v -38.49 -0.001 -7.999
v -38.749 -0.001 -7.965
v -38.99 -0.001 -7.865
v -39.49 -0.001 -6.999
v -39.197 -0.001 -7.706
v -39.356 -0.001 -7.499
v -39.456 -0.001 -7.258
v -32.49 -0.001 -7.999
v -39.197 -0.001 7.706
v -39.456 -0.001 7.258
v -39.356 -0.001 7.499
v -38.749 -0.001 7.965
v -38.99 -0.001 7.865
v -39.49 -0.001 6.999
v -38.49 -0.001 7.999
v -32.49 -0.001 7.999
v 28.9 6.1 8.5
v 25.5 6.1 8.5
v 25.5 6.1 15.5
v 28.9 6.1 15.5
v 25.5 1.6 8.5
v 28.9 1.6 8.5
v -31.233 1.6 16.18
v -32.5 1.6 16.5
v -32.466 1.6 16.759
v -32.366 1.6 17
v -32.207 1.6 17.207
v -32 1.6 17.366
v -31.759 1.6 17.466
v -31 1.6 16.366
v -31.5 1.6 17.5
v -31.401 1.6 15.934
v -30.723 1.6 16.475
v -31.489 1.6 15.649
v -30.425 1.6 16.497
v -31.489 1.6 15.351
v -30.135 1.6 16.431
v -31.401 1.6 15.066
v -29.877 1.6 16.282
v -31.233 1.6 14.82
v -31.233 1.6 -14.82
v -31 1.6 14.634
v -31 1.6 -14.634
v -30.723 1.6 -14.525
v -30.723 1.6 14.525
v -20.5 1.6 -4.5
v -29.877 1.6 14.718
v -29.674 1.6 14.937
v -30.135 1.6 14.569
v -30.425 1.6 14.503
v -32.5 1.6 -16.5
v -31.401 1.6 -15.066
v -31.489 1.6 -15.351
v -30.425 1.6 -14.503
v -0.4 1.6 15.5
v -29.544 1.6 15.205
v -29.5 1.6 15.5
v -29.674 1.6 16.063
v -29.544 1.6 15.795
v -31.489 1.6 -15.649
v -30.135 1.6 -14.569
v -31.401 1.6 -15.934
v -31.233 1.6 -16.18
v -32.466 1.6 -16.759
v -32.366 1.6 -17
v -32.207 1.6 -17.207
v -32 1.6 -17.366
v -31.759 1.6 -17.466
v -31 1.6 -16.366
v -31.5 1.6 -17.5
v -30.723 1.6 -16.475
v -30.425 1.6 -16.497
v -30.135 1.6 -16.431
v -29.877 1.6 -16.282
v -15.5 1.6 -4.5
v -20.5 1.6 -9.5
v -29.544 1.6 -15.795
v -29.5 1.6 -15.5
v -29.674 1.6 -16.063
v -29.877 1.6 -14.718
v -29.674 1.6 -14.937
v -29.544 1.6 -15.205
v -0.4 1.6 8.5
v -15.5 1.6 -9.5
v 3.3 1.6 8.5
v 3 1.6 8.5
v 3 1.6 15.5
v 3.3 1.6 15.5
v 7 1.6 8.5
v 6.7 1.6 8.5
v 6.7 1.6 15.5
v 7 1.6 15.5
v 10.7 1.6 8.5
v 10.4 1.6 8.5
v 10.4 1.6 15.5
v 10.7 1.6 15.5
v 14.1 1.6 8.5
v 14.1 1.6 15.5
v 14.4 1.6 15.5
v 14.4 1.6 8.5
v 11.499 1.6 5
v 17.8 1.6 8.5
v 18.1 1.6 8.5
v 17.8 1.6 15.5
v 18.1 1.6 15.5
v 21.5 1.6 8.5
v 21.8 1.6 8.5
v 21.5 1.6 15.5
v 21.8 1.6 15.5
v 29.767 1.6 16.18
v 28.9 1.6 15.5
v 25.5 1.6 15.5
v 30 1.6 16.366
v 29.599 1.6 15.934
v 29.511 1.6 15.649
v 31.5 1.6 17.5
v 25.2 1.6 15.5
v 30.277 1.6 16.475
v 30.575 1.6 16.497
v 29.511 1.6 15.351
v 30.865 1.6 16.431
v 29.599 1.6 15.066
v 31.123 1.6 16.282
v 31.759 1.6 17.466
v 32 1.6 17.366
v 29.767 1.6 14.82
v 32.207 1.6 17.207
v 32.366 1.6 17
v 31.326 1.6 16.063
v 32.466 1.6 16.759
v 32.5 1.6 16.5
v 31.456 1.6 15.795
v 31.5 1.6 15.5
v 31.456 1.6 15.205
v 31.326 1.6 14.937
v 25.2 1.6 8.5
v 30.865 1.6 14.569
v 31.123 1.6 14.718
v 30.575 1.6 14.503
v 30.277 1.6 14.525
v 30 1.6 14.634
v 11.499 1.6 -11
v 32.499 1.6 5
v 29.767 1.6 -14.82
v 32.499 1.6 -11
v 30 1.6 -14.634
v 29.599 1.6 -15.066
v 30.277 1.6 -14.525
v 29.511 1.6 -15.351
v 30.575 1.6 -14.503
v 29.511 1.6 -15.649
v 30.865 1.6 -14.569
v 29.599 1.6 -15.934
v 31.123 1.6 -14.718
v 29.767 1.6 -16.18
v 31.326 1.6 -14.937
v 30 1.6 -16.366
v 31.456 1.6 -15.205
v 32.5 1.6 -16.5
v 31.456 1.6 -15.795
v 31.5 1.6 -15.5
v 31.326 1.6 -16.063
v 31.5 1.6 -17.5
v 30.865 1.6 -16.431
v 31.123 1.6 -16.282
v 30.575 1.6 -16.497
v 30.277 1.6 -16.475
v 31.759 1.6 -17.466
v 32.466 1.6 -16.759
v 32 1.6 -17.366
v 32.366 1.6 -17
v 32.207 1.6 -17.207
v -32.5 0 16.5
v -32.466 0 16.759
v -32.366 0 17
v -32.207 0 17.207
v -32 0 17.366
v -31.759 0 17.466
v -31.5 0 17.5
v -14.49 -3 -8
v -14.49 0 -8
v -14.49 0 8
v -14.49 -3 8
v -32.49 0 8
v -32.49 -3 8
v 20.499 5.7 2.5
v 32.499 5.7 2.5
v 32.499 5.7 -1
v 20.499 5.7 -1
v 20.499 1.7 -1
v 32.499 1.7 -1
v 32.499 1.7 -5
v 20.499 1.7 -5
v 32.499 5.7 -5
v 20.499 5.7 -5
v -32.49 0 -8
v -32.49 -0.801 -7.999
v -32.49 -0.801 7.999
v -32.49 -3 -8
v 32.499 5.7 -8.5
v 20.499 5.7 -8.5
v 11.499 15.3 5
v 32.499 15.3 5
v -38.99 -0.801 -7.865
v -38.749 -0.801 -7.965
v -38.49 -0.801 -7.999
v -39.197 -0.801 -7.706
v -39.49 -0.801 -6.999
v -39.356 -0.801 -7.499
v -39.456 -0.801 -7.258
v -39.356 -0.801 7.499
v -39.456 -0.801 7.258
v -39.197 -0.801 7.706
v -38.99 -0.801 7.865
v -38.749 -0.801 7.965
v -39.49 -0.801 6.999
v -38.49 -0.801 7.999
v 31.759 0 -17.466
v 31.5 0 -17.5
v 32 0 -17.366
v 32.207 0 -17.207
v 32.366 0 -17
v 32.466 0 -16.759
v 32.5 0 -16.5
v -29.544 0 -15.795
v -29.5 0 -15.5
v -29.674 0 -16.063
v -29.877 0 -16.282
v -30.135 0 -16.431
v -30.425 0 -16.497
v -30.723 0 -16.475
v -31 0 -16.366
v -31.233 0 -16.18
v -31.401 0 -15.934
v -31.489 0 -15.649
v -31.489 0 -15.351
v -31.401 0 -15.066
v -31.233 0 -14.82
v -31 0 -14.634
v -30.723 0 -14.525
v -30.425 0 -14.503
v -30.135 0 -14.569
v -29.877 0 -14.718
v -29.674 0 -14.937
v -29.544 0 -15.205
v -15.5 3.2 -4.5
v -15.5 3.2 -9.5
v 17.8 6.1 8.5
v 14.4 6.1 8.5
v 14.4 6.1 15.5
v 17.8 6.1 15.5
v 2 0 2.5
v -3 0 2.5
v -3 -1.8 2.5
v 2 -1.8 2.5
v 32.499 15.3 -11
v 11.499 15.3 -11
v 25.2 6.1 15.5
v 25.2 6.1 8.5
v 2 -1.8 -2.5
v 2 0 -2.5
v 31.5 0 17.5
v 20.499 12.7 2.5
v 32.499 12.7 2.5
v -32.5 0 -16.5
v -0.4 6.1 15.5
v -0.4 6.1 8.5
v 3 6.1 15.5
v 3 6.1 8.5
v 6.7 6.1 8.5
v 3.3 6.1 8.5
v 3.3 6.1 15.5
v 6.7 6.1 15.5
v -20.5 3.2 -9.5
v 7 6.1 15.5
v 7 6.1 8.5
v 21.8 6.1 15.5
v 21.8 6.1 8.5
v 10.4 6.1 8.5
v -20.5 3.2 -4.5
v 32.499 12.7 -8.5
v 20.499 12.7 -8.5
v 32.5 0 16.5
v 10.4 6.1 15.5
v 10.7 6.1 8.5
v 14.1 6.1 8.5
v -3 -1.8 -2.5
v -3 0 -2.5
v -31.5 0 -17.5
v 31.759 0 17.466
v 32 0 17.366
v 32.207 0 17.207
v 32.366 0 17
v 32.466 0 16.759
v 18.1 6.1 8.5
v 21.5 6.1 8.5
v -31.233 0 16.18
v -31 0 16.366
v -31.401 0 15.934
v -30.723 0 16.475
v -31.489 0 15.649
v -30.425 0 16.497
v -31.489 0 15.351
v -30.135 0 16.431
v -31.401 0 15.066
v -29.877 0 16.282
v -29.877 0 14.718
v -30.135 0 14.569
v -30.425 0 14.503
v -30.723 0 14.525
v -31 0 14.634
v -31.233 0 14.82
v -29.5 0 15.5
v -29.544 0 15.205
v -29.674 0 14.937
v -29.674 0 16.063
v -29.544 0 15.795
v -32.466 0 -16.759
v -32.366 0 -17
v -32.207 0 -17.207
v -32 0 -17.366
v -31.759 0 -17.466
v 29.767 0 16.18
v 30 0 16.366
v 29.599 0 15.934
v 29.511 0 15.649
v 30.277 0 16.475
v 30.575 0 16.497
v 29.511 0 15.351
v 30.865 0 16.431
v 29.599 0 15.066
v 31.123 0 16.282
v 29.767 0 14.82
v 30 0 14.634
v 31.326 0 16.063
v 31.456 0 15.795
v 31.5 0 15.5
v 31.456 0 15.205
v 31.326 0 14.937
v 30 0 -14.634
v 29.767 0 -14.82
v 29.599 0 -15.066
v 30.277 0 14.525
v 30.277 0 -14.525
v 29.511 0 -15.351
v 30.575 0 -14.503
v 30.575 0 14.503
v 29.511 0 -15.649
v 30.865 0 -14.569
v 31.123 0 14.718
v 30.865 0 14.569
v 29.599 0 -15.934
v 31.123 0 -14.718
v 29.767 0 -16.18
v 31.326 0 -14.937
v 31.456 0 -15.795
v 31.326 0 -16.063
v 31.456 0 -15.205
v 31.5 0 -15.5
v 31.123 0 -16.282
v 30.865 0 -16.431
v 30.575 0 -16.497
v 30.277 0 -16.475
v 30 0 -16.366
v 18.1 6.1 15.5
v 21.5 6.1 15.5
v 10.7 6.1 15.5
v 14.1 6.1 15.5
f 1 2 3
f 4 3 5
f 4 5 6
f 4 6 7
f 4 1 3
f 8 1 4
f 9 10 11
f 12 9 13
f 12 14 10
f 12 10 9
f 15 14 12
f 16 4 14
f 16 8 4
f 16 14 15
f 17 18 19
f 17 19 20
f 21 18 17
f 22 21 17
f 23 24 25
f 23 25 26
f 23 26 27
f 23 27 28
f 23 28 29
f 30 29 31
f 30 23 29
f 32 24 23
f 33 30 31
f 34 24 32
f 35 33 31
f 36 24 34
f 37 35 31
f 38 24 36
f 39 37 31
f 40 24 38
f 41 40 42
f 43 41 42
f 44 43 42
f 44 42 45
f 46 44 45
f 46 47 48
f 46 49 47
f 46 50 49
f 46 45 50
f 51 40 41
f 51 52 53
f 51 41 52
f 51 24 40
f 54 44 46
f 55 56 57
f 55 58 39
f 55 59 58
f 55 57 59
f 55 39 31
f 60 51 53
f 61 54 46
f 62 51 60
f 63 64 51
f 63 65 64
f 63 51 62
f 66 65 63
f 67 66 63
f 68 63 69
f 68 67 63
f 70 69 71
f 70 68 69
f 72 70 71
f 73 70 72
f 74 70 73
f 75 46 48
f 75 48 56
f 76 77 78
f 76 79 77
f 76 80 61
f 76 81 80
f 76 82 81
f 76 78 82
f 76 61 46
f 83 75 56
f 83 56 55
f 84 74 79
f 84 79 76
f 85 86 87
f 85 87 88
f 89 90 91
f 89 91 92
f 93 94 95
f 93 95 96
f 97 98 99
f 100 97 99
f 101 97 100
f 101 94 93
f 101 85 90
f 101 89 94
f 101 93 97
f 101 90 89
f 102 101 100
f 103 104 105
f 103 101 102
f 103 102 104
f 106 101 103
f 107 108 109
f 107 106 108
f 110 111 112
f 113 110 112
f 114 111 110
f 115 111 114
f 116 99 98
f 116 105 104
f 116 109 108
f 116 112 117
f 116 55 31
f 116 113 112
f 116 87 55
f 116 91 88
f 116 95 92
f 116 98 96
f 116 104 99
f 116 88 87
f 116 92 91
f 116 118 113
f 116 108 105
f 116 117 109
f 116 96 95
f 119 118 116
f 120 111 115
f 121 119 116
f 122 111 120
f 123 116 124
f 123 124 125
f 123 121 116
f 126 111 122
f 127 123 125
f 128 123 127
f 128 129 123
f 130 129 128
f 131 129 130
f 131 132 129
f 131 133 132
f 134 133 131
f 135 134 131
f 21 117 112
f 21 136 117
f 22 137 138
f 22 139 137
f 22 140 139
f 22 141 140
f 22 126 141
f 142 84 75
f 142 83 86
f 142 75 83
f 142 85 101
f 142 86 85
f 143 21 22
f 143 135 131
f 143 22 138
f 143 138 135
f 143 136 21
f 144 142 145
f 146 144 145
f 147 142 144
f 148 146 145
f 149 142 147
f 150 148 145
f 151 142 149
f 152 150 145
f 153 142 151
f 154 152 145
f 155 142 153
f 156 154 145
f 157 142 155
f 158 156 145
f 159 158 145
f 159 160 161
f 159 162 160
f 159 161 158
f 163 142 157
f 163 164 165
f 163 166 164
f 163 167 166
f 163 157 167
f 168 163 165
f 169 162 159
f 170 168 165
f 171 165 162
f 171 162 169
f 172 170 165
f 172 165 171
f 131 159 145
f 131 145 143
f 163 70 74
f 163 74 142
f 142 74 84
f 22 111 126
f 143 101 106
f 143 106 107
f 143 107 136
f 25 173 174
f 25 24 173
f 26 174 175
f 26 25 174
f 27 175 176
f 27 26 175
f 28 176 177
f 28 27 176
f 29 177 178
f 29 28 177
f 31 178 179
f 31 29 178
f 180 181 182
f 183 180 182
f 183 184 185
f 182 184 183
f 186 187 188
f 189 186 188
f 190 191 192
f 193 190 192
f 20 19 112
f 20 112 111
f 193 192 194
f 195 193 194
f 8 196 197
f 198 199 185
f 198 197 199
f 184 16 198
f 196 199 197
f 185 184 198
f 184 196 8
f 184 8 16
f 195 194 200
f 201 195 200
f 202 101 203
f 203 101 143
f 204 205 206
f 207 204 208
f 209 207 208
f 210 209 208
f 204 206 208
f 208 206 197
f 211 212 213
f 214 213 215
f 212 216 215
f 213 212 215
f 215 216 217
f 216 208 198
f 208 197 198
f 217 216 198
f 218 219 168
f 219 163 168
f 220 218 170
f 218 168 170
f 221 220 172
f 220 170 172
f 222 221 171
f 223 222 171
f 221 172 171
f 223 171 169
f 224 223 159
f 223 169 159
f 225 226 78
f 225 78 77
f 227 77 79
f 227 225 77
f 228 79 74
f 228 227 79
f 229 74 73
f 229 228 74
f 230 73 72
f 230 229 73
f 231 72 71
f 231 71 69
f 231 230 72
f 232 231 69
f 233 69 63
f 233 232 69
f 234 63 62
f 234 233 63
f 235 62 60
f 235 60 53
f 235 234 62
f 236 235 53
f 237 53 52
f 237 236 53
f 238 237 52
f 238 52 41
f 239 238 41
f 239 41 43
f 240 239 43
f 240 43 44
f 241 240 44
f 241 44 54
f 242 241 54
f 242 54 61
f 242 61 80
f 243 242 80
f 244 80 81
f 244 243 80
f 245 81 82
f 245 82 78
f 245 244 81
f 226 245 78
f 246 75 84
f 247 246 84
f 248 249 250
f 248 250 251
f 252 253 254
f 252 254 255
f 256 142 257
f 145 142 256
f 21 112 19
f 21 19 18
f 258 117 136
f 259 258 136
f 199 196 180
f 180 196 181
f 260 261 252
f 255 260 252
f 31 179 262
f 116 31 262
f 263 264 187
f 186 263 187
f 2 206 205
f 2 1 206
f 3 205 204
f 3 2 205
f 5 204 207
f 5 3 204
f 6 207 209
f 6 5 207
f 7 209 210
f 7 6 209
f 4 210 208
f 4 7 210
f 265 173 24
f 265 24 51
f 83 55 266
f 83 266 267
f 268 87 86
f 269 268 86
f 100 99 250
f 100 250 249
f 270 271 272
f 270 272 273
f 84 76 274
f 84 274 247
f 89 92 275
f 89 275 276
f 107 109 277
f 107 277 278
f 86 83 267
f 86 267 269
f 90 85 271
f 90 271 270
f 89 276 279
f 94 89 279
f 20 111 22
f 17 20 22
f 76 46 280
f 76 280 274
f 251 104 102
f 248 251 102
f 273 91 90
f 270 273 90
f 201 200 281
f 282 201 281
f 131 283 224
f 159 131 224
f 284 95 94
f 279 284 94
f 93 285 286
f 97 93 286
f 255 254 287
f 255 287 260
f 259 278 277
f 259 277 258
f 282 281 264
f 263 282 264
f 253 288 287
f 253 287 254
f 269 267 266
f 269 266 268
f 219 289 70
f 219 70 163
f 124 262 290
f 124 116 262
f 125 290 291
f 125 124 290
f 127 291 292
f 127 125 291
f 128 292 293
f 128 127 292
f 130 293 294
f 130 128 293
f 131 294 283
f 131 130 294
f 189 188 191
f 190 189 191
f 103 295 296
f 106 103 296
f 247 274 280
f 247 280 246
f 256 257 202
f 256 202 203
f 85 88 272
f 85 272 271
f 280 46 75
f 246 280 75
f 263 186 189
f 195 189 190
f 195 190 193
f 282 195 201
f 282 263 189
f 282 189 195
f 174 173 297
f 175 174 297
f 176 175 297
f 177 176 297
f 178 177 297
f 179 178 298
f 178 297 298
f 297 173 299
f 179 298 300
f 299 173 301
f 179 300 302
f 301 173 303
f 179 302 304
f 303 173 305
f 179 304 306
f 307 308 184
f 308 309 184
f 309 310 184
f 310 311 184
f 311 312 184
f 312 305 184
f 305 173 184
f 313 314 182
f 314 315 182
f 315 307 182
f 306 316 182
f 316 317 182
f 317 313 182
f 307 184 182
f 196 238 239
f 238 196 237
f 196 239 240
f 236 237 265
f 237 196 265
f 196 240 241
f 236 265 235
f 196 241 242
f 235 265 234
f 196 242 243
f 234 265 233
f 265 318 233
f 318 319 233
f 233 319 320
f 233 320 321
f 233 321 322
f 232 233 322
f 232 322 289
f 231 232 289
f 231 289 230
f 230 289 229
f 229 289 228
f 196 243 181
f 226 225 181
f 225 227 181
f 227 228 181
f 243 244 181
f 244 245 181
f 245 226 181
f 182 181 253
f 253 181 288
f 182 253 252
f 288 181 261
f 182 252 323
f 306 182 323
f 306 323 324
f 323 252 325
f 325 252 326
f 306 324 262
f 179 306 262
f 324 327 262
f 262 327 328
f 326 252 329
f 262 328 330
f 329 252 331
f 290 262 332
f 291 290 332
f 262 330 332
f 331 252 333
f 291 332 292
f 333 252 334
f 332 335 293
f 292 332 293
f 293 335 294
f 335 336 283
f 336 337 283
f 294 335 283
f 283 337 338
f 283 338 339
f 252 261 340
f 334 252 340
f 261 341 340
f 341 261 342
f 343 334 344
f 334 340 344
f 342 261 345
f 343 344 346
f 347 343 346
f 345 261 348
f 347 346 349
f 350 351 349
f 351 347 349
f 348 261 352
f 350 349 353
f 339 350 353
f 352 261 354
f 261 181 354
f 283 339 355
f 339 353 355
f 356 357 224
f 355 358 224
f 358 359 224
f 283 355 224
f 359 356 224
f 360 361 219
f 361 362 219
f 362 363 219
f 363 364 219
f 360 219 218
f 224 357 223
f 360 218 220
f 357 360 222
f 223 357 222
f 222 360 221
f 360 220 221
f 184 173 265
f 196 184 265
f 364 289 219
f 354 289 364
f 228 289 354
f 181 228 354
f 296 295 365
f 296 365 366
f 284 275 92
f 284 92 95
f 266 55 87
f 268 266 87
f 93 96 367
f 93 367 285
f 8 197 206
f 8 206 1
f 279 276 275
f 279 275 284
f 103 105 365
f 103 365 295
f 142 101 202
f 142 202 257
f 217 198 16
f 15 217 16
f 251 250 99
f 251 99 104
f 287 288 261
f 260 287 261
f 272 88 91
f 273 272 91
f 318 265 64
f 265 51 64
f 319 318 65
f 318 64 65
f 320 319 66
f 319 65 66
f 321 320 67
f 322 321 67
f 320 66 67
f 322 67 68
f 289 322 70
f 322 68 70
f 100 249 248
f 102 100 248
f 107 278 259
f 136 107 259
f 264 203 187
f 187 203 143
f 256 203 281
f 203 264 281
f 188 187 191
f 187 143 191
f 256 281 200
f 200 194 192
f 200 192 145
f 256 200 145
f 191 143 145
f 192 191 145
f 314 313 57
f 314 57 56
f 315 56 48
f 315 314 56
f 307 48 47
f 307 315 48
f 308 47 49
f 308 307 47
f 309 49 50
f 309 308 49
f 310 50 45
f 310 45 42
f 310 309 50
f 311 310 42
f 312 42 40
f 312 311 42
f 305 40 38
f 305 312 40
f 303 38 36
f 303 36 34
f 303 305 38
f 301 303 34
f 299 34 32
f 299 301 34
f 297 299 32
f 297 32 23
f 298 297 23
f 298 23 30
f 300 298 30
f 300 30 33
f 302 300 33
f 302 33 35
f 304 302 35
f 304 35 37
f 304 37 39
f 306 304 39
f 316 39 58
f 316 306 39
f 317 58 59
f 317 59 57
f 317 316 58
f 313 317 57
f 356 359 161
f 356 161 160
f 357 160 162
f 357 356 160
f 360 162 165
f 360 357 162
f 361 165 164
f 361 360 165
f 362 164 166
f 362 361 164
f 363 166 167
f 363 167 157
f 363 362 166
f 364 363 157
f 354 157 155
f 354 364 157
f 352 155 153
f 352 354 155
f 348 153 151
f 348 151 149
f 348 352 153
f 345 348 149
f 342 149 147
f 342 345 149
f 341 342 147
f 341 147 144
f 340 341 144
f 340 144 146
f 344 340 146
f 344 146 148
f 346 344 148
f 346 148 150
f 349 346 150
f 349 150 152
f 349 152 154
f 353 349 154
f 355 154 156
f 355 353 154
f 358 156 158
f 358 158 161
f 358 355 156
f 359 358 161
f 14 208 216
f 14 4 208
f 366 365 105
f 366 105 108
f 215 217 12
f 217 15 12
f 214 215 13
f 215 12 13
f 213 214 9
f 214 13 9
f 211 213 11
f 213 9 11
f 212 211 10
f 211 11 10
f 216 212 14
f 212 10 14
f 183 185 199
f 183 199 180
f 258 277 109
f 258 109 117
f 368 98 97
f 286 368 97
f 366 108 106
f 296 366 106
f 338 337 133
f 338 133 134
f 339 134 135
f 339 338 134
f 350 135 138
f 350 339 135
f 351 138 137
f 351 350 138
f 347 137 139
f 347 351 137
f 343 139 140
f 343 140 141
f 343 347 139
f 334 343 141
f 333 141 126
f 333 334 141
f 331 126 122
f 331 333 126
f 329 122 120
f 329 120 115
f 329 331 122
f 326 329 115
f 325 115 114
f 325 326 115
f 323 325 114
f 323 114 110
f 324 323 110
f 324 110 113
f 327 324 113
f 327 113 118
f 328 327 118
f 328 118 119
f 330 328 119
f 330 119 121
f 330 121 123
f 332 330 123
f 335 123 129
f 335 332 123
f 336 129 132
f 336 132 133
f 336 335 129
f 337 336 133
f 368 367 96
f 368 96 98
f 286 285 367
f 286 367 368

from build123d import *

# Parameters (mm, degrees)
SKIZZE1_W                       = 65
SKIZZE1_H                       = 35
SKIZZE1_R                       = 1
AUFSATZ_LINEAR_AUSTRAGEN1_DEPTH = 1.6
VERRUNDUNG1_R                   = 1
SKIZZE2_W                       = 18
SKIZZE2_H                       = 16
AUFSATZ_LINEAR_AUSTRAGEN2_DEPTH = 3
SKIZZE3_W                       = 15.998
SKIZZE3_H                       = 0.8
AUFSATZ_LINEAR_AUSTRAGEN3_DEPTH = 7
VERRUNDUNG2_R                   = 1
SKIZZE4_W                       = 21
SKIZZE4_H                       = 16
AUFSATZ_LINEAR_AUSTRAGEN4_DEPTH = 13.7
SCHNITT_LINEAR_AUSTRAGEN1_DEPTH = 12
SKIZZE6_W                       = 3.4
SKIZZE6_H                       = 7
AUFSATZ_LINEAR_AUSTRAGEN5_DEPTH = 4.5
SKIZZE7_W                       = 5
SKIZZE7_H                       = 5
AUFSATZ_LINEAR_AUSTRAGEN6_DEPTH = 1.8
SKIZZE8_W                       = 5
SKIZZE8_H                       = 5
AUFSATZ_LINEAR_AUSTRAGEN7_DEPTH = 1.6


with BuildPart() as part:
    # Skizze1 → Aufsatz-Linear austragen1 (new body)
    with BuildSketch(Plane(origin=(0, 0, 0), x_dir=(1, 0, 0), z_dir=(0, 1, 0))):
        Rectangle(SKIZZE1_W, SKIZZE1_H)
        with Locations((-30.5, -15.5)):
            Circle(SKIZZE1_R, mode=Mode.SUBTRACT)
        with Locations((30.5, -15.5)):
            Circle(SKIZZE1_R, mode=Mode.SUBTRACT)
        with Locations((30.5, 15.5)):
            Circle(SKIZZE1_R, mode=Mode.SUBTRACT)
        with Locations((-30.5, 15.5)):
            Circle(SKIZZE1_R, mode=Mode.SUBTRACT)
    extrude(amount=AUFSATZ_LINEAR_AUSTRAGEN1_DEPTH)

    # Verrundung1
    verrundung1_edges = [part.edges().sort_by_distance(p)[0] for p in [
        (32.5, 0.8, -17.5),
        (32.5, 0.8, 17.5),
        (-32.5, 0.8, 17.5),
        (-32.5, 0.8, -17.5),
    ]]
    fillet(verrundung1_edges, radius=VERRUNDUNG1_R)

    # Skizze2 → Aufsatz-Linear austragen2 (add)
    with BuildSketch(Plane.XZ):
        with Locations((-23.49, 0)):
            Rectangle(SKIZZE2_W, SKIZZE2_H)
    extrude(amount=AUFSATZ_LINEAR_AUSTRAGEN2_DEPTH)

    # Skizze3 → Aufsatz-Linear austragen3 (add)
    with BuildSketch(Plane.ZY.offset(32.49)):
        with Locations((0, -0.401)):
            Rectangle(SKIZZE3_W, SKIZZE3_H)
    extrude(amount=AUFSATZ_LINEAR_AUSTRAGEN3_DEPTH)

    # Verrundung2
    verrundung2_edges = [part.edges().sort_by_distance(p)[0] for p in [
        (-39.49, -0.401, -7.999),
        (-39.49, -0.401, 7.999),
    ]]
    fillet(verrundung2_edges, radius=VERRUNDUNG2_R)

    # Skizze4 → Aufsatz-Linear austragen4 (add)
    with BuildSketch(Plane(origin=(0, 1.6, 0), x_dir=(1, 0, 0), z_dir=(0, 1, 0))):
        with Locations((21.999, 3)):
            Rectangle(SKIZZE4_W, SKIZZE4_H)
    extrude(amount=AUFSATZ_LINEAR_AUSTRAGEN4_DEPTH)

    # Skizze5 → Schnitt-Linear austragen1 (cut)
    with BuildSketch(Plane(origin=(32.499, 0, 0), x_dir=(0, 0, -1), z_dir=(1, 0, 0))):
        Polygon((8.5, 12.7), (-2.5, 12.7), (-2.5, 5.7), (1, 5.7), (1, 1.7), (5, 1.7), (5, 5.7), (8.5, 5.7), align=None)
    extrude(amount=-SCHNITT_LINEAR_AUSTRAGEN1_DEPTH, mode=Mode.SUBTRACT)

    # Skizze6 → Aufsatz-Linear austragen5 (add)
    with BuildSketch(Plane(origin=(0, 1.6, 0), x_dir=(1, 0, 0), z_dir=(0, 1, 0))):
        with Locations((27.2, -12)):
            Rectangle(SKIZZE6_W, SKIZZE6_H)
        with Locations((23.5, -12)):
            Rectangle(SKIZZE6_W, SKIZZE6_H)
        with Locations((19.8, -12)):
            Rectangle(SKIZZE6_W, SKIZZE6_H)
        with Locations((16.1, -12)):
            Rectangle(SKIZZE6_W, SKIZZE6_H)
        with Locations((12.4, -12)):
            Rectangle(SKIZZE6_W, SKIZZE6_H)
        with Locations((8.7, -12)):
            Rectangle(SKIZZE6_W, SKIZZE6_H)
        with Locations((5, -12)):
            Rectangle(SKIZZE6_W, SKIZZE6_H)
        with Locations((1.3, -12)):
            Rectangle(SKIZZE6_W, SKIZZE6_H)
    extrude(amount=AUFSATZ_LINEAR_AUSTRAGEN5_DEPTH)

    # Skizze7 → Aufsatz-Linear austragen6 (add)
    with BuildSketch(Plane.XZ):
        with Locations((-0.5, 0)):
            Rectangle(SKIZZE7_W, SKIZZE7_H)
    extrude(amount=AUFSATZ_LINEAR_AUSTRAGEN6_DEPTH)

    # Skizze8 → Aufsatz-Linear austragen7 (add)
    with BuildSketch(Plane(origin=(0, 1.6, 0), x_dir=(1, 0, 0), z_dir=(0, 1, 0))):
        with Locations((-18, 7)):
            Rectangle(SKIZZE8_W, SKIZZE8_H)
    extrude(amount=AUFSATZ_LINEAR_AUSTRAGEN7_DEPTH)


solid = part.part
